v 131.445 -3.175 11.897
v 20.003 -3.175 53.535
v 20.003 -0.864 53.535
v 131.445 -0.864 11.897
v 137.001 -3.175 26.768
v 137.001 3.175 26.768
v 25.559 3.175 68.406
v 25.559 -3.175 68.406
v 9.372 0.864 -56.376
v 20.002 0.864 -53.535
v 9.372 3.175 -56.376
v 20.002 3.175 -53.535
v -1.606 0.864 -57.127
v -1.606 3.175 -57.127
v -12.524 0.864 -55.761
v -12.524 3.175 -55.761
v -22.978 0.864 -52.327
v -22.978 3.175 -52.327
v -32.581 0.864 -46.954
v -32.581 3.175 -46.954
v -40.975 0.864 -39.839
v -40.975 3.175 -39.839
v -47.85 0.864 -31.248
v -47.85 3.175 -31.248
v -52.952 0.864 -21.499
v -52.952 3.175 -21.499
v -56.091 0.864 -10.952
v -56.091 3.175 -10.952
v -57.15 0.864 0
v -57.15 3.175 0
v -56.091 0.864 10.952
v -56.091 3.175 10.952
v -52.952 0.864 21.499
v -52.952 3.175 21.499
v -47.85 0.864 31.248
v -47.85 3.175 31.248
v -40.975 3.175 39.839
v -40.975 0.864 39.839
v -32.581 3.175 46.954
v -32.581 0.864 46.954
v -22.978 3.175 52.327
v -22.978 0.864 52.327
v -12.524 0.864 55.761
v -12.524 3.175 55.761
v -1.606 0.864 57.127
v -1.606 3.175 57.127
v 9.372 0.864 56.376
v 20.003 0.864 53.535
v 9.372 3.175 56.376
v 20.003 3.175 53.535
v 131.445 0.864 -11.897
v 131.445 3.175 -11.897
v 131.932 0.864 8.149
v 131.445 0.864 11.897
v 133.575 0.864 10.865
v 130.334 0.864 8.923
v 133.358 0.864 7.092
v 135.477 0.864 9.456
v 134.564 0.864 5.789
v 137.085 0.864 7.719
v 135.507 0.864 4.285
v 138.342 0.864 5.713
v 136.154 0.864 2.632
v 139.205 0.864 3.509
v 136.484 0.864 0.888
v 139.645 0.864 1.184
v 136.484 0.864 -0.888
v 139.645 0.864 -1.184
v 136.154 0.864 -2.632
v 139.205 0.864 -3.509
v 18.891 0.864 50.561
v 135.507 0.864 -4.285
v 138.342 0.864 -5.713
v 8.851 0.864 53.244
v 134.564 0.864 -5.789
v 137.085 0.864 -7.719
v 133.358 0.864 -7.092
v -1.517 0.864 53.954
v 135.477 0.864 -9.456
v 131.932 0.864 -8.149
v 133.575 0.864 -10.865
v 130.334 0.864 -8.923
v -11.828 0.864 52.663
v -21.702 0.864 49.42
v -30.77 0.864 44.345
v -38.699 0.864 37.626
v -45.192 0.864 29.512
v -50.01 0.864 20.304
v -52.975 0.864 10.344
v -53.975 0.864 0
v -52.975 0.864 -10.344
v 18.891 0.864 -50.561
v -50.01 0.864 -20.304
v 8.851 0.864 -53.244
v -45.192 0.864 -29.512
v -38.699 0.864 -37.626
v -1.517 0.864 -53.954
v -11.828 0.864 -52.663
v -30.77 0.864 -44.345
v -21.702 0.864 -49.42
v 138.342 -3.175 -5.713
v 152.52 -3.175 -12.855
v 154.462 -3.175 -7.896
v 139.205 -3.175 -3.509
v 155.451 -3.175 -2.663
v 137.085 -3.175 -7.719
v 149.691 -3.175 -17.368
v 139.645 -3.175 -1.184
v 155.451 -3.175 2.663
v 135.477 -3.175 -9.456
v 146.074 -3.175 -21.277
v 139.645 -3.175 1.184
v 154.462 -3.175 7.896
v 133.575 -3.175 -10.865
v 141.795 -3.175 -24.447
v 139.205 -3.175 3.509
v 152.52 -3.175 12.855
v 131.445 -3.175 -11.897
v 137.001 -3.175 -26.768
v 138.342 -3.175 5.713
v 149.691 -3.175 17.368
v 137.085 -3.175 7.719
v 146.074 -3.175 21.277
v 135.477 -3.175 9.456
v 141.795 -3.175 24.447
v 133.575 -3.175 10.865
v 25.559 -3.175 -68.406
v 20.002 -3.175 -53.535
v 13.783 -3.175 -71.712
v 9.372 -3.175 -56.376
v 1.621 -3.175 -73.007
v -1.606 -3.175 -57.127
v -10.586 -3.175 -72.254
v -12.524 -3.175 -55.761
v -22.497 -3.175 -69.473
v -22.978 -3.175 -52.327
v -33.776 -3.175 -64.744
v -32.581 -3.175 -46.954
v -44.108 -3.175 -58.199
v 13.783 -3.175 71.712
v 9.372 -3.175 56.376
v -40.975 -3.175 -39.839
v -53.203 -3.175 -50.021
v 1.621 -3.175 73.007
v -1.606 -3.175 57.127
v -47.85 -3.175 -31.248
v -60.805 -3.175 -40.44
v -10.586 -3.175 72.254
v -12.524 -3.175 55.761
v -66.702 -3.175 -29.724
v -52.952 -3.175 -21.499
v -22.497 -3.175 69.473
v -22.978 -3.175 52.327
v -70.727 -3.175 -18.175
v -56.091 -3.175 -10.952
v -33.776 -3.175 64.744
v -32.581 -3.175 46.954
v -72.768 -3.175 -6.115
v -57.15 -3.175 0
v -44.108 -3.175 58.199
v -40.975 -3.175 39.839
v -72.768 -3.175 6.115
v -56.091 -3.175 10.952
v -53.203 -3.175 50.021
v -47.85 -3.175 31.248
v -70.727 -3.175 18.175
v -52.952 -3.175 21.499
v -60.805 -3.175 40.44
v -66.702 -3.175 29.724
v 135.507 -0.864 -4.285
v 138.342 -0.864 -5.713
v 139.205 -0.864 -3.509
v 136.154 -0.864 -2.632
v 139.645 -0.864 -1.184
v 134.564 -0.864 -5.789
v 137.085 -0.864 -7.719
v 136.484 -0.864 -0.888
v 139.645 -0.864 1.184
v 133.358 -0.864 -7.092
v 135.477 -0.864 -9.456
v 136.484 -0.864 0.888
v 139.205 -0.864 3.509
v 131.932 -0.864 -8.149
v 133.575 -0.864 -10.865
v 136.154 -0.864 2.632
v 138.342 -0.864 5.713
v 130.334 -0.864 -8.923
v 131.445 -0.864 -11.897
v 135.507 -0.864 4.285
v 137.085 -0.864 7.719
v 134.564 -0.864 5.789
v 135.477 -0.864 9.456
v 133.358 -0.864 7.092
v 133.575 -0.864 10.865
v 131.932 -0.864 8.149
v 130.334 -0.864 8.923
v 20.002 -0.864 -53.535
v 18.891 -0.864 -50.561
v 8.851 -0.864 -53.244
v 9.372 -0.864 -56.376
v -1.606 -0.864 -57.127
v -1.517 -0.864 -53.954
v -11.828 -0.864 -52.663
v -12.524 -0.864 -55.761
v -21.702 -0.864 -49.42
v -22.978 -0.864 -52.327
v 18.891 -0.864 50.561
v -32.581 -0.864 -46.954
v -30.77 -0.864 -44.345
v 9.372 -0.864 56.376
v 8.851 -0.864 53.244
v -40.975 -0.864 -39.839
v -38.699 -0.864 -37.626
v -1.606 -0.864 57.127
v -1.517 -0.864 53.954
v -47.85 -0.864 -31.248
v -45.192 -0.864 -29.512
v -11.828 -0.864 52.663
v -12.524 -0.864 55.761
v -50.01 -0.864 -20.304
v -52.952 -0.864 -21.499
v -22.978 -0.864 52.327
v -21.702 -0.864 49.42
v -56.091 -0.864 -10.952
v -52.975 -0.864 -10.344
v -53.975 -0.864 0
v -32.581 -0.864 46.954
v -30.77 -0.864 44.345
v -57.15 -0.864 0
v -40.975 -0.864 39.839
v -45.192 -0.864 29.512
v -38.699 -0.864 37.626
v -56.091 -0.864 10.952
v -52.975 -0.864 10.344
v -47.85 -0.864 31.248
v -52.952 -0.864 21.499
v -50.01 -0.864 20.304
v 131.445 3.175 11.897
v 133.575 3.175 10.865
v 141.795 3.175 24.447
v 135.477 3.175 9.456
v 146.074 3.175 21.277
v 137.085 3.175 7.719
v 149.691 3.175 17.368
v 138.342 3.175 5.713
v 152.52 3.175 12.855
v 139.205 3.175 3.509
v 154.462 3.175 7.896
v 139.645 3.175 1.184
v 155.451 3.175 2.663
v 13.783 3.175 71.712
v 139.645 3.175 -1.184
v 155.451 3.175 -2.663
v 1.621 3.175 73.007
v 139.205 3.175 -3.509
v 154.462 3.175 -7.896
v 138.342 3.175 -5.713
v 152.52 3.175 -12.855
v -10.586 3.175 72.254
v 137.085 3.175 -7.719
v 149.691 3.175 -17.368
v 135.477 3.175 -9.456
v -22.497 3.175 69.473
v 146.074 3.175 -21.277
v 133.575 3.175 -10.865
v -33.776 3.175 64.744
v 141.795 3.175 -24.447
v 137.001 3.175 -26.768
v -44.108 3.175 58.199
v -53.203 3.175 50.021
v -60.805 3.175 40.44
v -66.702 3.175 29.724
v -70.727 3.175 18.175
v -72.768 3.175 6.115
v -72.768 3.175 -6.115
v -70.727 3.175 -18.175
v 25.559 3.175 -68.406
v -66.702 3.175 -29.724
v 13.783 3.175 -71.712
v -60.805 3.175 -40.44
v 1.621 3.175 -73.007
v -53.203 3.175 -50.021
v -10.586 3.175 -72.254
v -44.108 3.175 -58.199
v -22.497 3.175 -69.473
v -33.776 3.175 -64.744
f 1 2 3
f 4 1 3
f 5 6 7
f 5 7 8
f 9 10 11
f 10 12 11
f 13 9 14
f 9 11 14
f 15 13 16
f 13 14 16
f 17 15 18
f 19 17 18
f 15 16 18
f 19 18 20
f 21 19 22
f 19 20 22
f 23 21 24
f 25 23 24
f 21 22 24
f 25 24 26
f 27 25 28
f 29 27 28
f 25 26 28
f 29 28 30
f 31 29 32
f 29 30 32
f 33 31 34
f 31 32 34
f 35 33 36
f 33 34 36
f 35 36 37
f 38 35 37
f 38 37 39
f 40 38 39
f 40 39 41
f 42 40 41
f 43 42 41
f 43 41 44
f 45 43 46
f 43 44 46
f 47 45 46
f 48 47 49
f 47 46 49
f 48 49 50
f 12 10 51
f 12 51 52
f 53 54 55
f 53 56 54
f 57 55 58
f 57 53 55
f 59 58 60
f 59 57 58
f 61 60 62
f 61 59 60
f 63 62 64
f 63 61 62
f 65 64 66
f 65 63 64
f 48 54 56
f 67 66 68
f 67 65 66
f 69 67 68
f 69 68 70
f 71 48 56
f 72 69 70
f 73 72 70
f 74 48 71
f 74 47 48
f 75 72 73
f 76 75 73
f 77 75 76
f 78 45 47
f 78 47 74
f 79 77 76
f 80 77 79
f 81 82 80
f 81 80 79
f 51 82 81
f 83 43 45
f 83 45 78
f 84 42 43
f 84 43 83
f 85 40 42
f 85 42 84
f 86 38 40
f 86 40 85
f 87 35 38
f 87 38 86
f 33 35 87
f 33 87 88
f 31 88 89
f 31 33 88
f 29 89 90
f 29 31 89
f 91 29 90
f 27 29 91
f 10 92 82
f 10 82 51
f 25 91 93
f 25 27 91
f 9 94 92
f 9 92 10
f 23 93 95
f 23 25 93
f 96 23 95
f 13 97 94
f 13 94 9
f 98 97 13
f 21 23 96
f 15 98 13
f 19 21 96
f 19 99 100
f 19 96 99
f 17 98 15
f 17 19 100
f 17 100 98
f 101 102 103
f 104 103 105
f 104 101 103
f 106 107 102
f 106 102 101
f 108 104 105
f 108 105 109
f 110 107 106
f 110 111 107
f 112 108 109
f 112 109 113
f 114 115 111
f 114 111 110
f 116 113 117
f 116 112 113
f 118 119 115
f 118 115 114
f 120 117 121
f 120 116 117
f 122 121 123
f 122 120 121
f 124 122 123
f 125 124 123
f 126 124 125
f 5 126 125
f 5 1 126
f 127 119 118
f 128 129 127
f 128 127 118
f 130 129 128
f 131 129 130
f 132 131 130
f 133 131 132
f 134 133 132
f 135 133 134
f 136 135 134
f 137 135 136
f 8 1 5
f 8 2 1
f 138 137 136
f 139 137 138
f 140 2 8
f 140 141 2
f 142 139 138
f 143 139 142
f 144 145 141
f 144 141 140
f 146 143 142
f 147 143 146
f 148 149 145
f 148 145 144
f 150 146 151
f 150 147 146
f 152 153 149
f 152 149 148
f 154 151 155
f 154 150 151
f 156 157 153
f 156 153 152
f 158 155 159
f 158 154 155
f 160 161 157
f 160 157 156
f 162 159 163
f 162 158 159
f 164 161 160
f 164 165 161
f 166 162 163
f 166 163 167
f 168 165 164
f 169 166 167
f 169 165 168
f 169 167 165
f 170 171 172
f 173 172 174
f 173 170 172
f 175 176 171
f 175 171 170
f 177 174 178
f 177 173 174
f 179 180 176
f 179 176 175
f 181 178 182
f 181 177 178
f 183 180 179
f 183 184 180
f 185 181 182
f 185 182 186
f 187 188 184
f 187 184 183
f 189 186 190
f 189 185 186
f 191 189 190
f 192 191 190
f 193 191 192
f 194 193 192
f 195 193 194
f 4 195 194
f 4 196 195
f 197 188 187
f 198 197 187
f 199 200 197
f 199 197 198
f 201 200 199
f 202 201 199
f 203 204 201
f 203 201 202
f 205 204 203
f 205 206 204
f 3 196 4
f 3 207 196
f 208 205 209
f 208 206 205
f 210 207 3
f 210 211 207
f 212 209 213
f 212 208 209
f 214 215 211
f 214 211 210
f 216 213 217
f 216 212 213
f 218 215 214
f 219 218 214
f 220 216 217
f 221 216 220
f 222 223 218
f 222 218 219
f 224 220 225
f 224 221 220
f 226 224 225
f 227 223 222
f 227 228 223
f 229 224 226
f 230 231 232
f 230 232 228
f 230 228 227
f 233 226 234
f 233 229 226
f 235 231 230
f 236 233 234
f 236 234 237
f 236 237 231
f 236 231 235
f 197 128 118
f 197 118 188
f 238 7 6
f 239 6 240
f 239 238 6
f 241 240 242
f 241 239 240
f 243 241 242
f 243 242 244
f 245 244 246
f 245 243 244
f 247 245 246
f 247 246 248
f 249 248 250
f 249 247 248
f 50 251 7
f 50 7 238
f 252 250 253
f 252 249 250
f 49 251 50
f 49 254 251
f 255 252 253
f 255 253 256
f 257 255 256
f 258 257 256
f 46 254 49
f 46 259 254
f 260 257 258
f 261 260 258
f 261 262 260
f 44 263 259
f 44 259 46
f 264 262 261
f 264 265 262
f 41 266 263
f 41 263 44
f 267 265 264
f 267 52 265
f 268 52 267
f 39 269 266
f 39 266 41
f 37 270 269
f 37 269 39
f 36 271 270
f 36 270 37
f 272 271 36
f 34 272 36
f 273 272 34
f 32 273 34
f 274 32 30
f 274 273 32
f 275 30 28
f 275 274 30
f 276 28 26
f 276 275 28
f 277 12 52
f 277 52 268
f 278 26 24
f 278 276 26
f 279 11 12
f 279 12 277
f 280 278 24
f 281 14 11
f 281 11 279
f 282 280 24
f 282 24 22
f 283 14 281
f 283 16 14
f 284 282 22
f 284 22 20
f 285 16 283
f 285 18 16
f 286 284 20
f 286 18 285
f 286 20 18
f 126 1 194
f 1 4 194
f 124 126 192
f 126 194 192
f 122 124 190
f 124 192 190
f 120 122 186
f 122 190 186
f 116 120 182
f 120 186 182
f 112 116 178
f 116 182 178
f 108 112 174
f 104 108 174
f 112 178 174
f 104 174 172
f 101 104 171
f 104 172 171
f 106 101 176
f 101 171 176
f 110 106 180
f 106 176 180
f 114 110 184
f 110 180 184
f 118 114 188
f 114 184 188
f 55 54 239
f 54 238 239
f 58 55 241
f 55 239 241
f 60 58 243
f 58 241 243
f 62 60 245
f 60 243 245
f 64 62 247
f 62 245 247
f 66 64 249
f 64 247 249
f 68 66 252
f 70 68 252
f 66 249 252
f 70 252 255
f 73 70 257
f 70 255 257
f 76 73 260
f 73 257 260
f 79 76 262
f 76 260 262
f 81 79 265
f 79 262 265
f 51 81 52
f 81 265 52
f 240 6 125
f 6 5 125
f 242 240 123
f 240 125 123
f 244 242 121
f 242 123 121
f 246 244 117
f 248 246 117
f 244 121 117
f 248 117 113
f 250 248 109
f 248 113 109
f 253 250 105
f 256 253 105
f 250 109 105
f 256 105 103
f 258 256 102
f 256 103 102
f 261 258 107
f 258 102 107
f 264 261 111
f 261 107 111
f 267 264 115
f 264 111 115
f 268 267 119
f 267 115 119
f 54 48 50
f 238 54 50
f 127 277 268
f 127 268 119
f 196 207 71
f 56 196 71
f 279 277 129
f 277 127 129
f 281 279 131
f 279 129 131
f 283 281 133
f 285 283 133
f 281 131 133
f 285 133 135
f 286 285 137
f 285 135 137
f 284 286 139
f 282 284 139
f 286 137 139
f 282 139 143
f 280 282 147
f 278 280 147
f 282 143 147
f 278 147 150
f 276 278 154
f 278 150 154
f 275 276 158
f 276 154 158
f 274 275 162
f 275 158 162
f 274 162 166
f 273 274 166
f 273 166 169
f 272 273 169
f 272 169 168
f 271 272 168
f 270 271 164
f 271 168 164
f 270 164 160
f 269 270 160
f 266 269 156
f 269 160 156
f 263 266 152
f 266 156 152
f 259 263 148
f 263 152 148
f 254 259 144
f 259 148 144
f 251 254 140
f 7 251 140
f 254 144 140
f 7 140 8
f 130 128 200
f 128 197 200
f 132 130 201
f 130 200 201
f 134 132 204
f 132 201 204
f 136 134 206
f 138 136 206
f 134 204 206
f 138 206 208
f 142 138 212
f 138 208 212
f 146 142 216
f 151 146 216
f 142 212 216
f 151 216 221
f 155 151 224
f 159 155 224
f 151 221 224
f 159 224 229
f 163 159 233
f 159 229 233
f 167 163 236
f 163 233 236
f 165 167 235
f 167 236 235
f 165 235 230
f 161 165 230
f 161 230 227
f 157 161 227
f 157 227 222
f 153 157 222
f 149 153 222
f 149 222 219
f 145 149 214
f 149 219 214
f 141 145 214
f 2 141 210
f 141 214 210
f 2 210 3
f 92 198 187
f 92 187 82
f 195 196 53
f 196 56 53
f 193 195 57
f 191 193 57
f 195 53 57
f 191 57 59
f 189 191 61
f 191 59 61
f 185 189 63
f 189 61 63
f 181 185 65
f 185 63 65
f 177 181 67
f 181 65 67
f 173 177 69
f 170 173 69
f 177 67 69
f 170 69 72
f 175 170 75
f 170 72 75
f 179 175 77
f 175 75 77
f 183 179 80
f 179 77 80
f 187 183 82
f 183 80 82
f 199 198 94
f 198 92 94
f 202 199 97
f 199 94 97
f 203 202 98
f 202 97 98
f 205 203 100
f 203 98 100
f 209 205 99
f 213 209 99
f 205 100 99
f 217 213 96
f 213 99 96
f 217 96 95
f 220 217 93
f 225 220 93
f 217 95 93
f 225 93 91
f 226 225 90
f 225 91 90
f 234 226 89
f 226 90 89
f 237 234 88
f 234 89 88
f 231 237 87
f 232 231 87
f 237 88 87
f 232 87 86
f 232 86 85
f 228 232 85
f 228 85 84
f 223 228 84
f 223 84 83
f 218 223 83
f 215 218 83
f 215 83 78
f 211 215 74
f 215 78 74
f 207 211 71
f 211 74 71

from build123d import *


with BuildPart() as part:
    # Sweep1: sweep along a path in Sketch2
    with BuildLine(Plane(origin=(0, 0, 0), x_dir=(1, 0, 0), z_dir=(0, 1, 0))) as sweep1_path:
        Line((131.445, 11.896721187), (20.0025, 53.535245341))
        ThreePointArc((20.0025, 53.535245341), (-57.15, 0), (20.0025, -53.535245341))
        Line((20.0025, -53.535245341), (131.445, -11.896721187))
        ThreePointArc((131.445, -11.896721187), (139.7, 0), (131.445, 11.896721187))
    # Sketch3 → Sweep1 (sweep)
    with BuildSketch(Plane.XY):
        Polygon((-57.15, 3.175), (-73.025, 3.175), (-73.025, -3.175), (-57.15, -3.175), (-57.15, -0.8636), (-53.975, -0.8636), (-53.975, 0.8636), (-57.15, 0.8636), align=None)
    sweep(path=sweep1_path.line)


solid = part.part
